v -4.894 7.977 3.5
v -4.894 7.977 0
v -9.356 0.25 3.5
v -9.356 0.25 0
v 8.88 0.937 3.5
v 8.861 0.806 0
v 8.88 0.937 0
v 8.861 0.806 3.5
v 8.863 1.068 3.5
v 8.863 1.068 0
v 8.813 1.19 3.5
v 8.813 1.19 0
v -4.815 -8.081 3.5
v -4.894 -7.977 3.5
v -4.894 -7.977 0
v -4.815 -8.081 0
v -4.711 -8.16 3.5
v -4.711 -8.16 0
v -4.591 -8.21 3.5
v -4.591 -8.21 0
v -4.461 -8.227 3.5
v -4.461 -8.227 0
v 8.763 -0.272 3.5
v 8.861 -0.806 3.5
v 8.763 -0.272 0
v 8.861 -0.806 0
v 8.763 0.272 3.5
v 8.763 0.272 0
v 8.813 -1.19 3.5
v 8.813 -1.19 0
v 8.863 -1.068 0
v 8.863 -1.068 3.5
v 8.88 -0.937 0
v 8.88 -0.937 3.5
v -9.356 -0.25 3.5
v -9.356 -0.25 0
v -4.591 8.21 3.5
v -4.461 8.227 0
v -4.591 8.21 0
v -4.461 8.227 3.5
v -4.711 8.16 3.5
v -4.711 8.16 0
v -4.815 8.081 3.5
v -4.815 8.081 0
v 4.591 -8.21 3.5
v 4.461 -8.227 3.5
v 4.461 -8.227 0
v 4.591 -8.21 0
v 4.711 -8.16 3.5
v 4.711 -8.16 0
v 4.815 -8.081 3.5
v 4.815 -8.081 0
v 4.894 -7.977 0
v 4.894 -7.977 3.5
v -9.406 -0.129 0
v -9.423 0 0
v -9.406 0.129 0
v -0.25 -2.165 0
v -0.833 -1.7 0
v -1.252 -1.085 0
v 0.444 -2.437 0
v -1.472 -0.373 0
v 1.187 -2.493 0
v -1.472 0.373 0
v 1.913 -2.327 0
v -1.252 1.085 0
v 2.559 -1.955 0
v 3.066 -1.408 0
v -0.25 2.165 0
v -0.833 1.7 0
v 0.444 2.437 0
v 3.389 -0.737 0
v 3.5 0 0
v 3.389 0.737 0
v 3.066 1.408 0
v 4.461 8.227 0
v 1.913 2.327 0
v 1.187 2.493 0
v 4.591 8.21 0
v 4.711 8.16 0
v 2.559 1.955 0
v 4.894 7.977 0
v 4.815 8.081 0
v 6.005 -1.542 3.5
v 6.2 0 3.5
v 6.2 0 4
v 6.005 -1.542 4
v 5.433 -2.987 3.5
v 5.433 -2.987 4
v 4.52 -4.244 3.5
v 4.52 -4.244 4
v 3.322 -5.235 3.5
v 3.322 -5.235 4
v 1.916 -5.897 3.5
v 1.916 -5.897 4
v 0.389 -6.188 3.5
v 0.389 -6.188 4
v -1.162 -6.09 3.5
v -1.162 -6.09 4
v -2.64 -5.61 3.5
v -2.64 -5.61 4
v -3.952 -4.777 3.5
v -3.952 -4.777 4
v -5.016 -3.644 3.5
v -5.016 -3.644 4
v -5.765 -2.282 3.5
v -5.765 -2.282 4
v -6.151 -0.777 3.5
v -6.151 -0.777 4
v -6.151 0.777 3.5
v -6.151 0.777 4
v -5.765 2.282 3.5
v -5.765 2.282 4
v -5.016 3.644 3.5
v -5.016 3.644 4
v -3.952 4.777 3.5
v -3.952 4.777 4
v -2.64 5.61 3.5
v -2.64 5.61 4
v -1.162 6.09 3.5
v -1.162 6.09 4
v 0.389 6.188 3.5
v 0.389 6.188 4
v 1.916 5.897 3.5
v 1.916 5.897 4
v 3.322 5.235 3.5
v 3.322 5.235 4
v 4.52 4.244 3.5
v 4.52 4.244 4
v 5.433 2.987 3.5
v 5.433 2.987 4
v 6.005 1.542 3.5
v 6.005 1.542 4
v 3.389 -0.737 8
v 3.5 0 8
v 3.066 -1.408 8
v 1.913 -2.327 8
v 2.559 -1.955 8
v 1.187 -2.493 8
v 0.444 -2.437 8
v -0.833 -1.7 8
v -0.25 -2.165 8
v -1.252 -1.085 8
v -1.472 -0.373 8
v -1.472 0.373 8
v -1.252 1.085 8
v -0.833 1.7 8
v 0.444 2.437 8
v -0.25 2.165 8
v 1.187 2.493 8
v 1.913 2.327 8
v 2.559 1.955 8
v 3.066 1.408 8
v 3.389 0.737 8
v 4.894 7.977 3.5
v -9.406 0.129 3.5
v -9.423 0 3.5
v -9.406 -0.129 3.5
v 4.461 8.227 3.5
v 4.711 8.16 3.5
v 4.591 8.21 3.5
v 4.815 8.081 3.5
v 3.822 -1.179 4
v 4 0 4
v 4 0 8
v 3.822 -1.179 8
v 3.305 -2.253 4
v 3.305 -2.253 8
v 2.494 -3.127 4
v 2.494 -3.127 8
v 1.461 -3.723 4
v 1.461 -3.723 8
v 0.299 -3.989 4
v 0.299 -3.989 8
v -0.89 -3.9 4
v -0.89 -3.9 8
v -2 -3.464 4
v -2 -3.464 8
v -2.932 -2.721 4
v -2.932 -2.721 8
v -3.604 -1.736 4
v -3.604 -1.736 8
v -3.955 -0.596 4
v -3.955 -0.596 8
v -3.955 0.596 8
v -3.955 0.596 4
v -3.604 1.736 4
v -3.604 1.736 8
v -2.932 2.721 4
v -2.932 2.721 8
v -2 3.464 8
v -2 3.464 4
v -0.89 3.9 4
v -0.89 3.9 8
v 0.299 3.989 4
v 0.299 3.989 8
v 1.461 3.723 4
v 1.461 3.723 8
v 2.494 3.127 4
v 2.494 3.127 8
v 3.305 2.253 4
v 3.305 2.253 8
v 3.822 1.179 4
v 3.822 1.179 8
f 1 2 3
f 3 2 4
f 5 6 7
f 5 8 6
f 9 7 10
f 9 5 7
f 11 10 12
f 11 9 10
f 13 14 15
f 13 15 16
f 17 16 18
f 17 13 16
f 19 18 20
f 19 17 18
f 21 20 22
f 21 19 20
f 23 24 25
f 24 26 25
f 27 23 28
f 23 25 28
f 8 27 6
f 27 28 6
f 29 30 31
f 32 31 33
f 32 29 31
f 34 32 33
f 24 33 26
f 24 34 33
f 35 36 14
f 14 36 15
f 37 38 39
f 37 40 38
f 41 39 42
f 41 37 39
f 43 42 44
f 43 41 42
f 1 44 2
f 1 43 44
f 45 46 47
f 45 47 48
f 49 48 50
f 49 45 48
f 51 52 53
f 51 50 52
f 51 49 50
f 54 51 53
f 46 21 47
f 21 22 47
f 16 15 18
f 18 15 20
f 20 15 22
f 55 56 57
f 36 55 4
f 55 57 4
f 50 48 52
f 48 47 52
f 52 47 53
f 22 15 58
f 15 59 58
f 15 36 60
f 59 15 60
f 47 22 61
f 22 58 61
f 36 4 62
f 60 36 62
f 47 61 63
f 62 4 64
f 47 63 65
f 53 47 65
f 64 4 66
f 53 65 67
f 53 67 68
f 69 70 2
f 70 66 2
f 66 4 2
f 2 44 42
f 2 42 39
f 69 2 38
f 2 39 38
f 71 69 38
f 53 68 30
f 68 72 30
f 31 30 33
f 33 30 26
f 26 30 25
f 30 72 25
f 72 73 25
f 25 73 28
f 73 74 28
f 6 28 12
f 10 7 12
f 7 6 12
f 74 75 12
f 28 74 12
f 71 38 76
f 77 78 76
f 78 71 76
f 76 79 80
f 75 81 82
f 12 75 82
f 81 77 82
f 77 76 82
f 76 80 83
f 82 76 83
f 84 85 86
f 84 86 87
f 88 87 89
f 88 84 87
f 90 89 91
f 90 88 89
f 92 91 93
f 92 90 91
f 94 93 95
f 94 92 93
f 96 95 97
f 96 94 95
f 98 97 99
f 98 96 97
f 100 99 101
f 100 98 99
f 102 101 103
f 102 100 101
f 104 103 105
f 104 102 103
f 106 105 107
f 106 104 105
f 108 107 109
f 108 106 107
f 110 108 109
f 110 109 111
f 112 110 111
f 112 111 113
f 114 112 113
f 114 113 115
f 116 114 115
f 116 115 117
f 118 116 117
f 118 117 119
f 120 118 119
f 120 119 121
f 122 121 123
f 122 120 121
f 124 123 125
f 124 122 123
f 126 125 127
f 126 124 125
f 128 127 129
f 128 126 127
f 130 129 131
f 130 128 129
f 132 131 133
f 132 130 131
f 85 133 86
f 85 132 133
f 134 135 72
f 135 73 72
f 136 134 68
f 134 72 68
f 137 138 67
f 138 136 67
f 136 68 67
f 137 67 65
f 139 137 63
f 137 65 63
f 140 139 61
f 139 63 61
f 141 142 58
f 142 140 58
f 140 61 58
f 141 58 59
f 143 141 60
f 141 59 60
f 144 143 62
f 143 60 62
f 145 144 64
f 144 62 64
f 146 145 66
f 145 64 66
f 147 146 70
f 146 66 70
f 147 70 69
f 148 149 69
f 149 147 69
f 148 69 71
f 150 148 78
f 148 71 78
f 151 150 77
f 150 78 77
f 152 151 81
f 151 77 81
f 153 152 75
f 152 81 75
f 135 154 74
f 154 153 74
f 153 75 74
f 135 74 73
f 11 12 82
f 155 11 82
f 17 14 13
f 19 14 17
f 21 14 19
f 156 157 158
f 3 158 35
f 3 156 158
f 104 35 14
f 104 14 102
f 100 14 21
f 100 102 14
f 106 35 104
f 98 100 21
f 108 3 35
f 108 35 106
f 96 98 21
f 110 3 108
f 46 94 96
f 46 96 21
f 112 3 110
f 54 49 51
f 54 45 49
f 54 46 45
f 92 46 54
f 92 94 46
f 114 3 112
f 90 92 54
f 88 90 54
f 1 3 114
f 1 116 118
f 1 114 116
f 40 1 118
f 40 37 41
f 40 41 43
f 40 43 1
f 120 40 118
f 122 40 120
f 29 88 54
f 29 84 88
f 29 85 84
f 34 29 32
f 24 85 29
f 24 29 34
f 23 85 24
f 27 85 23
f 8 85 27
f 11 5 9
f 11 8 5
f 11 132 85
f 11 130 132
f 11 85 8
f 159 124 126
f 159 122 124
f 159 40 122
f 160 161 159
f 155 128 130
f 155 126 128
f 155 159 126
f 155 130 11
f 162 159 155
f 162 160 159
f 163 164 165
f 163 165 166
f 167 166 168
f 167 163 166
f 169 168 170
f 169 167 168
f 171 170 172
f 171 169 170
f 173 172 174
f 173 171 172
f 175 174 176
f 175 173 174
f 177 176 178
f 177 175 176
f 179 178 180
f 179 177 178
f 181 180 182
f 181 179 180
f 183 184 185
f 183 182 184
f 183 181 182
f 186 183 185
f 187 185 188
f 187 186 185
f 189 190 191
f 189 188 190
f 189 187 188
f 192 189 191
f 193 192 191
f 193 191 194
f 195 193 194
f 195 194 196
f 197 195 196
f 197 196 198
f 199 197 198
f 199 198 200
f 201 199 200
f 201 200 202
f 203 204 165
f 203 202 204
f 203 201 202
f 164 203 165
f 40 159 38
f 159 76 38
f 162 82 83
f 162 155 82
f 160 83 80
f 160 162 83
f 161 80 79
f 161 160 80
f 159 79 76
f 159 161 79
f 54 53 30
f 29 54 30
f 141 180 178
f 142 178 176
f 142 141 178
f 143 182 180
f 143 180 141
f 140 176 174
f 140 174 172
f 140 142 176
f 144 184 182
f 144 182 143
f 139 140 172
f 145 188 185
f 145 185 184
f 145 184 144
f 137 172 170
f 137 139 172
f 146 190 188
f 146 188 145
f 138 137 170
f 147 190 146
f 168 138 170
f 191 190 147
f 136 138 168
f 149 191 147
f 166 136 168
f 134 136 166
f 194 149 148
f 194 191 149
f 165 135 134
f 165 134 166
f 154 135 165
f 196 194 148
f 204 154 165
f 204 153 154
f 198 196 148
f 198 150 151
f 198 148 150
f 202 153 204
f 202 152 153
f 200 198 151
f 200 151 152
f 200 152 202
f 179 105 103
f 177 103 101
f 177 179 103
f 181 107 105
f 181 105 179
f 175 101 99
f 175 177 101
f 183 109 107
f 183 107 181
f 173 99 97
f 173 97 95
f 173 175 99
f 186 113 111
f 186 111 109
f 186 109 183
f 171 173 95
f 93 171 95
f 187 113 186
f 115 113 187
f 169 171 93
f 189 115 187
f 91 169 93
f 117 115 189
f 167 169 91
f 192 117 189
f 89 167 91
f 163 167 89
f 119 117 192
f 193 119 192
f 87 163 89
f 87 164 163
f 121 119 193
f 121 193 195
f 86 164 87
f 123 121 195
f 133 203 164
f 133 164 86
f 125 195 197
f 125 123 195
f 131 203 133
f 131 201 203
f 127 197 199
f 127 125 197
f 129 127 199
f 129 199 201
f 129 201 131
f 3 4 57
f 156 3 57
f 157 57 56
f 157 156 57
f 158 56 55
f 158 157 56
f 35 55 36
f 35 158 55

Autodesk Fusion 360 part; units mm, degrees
sketch "Sketch1" plane through (0, 0, 0) normal (0, 0, 1) x (1, 0, 0)
  circle A0 centre (0, 0) radius 6.2
  circle A1 centre (0, 0) radius 4
  circle A2 centre (1, 0) radius 2.5
  line L0 (9.5, 0) -> (4.75, 8.2272)
  line L1 (4.75, 8.2272) -> (-4.75, 8.2272)
  line L2 (-4.75, 8.2272) -> (-9.5, 0)
  line L3 (-9.5, 0) -> (-4.75, -8.2272)
  line L4 (-4.75, -8.2272) -> (4.75, -8.2272)
  line L5 (4.75, -8.2272) -> (9.5, 0)
  line L6 (0, 0) -> (1, 0) construction
  circle A3 centre (11.7511, 0) radius 3
  line L7 (9.5, 0) -> (11.7511, 0) construction
  line L8 (8.9226, 1) -> (8.9226, -1) construction
  dimension "d1" = 16.4545
  dimension "d2" = 12.4
  dimension "d3" = 8
  dimension "d4" = 5
  dimension "d5" = 1
  dimension "d6" = 6
  dimension "d7" = 2
extrude "Extrude1" add sketch "Sketch1" along normal blind 8 contours A1
extrude "Extrude2" add sketch "Sketch1" along normal blind 3.5 contours A0 | L0 L1 L2 L3 L4 L5 A3
extrude "Extrude3" add sketch "Sketch1" along normal blind 0.5 from surface at 3.5 contours A0
fillet "Fillet1" radius 0.5 5 edges at (4.75, -8.2272, 1.75) (-4.75, -8.2272, 1.75) (-9.5, 0, 1.75) (-4.75, 8.2272, 1.75) (4.75, 8.2272, 1.75)
fillet "Fillet2" radius 0.5 2 edges at (8.9226, 1, 1.75) (8.9226, -1, 1.75)
sketch "Sketch2" plane through (0, 0, 0) normal (0, 0, 1) x (1, 0, 0)
  circle A0 centre (1, 0) radius 2.5
  arc A1 (8.8128, -1.1903) -> (8.8614, -0.806) centre (8.3798, -0.9403) ccw
  line L0 (8.8128, -1.1903) -> (4.8943, -7.9772)
  arc A2 (4.4613, -8.2272) -> (4.8943, -7.9772) centre (4.4613, -7.7272) ccw
  line L1 (4.4613, -8.2272) -> (-4.4613, -8.2272)
  arc A3 (-4.8943, -7.9772) -> (-4.4613, -8.2272) centre (-4.4613, -7.7272) ccw
  line L2 (-4.8943, -7.9772) -> (-9.3557, -0.25)
  arc A4 (-9.3557, 0.25) -> (-9.3557, -0.25) centre (-8.9226, 0) ccw
  line L3 (-9.3557, 0.25) -> (-4.8943, 7.9772)
  arc A5 (-4.4613, 8.2272) -> (-4.8943, 7.9772) centre (-4.4613, 7.7272) ccw
  line L4 (-4.4613, 8.2272) -> (4.4613, 8.2272)
  arc A6 (4.8943, 7.9772) -> (4.4613, 8.2272) centre (4.4613, 7.7272) ccw
  line L5 (4.8943, 7.9772) -> (8.8128, 1.1903)
  arc A7 (8.8614, 0.806) -> (8.8128, 1.1903) centre (8.3798, 0.9403) ccw
  arc A8 (8.8614, 0.806) -> (8.8614, -0.806) centre (11.7511, 0) ccw
  circle A9 centre (0, 0) radius 4
  circle A10 centre (0, 0) radius 6.2
